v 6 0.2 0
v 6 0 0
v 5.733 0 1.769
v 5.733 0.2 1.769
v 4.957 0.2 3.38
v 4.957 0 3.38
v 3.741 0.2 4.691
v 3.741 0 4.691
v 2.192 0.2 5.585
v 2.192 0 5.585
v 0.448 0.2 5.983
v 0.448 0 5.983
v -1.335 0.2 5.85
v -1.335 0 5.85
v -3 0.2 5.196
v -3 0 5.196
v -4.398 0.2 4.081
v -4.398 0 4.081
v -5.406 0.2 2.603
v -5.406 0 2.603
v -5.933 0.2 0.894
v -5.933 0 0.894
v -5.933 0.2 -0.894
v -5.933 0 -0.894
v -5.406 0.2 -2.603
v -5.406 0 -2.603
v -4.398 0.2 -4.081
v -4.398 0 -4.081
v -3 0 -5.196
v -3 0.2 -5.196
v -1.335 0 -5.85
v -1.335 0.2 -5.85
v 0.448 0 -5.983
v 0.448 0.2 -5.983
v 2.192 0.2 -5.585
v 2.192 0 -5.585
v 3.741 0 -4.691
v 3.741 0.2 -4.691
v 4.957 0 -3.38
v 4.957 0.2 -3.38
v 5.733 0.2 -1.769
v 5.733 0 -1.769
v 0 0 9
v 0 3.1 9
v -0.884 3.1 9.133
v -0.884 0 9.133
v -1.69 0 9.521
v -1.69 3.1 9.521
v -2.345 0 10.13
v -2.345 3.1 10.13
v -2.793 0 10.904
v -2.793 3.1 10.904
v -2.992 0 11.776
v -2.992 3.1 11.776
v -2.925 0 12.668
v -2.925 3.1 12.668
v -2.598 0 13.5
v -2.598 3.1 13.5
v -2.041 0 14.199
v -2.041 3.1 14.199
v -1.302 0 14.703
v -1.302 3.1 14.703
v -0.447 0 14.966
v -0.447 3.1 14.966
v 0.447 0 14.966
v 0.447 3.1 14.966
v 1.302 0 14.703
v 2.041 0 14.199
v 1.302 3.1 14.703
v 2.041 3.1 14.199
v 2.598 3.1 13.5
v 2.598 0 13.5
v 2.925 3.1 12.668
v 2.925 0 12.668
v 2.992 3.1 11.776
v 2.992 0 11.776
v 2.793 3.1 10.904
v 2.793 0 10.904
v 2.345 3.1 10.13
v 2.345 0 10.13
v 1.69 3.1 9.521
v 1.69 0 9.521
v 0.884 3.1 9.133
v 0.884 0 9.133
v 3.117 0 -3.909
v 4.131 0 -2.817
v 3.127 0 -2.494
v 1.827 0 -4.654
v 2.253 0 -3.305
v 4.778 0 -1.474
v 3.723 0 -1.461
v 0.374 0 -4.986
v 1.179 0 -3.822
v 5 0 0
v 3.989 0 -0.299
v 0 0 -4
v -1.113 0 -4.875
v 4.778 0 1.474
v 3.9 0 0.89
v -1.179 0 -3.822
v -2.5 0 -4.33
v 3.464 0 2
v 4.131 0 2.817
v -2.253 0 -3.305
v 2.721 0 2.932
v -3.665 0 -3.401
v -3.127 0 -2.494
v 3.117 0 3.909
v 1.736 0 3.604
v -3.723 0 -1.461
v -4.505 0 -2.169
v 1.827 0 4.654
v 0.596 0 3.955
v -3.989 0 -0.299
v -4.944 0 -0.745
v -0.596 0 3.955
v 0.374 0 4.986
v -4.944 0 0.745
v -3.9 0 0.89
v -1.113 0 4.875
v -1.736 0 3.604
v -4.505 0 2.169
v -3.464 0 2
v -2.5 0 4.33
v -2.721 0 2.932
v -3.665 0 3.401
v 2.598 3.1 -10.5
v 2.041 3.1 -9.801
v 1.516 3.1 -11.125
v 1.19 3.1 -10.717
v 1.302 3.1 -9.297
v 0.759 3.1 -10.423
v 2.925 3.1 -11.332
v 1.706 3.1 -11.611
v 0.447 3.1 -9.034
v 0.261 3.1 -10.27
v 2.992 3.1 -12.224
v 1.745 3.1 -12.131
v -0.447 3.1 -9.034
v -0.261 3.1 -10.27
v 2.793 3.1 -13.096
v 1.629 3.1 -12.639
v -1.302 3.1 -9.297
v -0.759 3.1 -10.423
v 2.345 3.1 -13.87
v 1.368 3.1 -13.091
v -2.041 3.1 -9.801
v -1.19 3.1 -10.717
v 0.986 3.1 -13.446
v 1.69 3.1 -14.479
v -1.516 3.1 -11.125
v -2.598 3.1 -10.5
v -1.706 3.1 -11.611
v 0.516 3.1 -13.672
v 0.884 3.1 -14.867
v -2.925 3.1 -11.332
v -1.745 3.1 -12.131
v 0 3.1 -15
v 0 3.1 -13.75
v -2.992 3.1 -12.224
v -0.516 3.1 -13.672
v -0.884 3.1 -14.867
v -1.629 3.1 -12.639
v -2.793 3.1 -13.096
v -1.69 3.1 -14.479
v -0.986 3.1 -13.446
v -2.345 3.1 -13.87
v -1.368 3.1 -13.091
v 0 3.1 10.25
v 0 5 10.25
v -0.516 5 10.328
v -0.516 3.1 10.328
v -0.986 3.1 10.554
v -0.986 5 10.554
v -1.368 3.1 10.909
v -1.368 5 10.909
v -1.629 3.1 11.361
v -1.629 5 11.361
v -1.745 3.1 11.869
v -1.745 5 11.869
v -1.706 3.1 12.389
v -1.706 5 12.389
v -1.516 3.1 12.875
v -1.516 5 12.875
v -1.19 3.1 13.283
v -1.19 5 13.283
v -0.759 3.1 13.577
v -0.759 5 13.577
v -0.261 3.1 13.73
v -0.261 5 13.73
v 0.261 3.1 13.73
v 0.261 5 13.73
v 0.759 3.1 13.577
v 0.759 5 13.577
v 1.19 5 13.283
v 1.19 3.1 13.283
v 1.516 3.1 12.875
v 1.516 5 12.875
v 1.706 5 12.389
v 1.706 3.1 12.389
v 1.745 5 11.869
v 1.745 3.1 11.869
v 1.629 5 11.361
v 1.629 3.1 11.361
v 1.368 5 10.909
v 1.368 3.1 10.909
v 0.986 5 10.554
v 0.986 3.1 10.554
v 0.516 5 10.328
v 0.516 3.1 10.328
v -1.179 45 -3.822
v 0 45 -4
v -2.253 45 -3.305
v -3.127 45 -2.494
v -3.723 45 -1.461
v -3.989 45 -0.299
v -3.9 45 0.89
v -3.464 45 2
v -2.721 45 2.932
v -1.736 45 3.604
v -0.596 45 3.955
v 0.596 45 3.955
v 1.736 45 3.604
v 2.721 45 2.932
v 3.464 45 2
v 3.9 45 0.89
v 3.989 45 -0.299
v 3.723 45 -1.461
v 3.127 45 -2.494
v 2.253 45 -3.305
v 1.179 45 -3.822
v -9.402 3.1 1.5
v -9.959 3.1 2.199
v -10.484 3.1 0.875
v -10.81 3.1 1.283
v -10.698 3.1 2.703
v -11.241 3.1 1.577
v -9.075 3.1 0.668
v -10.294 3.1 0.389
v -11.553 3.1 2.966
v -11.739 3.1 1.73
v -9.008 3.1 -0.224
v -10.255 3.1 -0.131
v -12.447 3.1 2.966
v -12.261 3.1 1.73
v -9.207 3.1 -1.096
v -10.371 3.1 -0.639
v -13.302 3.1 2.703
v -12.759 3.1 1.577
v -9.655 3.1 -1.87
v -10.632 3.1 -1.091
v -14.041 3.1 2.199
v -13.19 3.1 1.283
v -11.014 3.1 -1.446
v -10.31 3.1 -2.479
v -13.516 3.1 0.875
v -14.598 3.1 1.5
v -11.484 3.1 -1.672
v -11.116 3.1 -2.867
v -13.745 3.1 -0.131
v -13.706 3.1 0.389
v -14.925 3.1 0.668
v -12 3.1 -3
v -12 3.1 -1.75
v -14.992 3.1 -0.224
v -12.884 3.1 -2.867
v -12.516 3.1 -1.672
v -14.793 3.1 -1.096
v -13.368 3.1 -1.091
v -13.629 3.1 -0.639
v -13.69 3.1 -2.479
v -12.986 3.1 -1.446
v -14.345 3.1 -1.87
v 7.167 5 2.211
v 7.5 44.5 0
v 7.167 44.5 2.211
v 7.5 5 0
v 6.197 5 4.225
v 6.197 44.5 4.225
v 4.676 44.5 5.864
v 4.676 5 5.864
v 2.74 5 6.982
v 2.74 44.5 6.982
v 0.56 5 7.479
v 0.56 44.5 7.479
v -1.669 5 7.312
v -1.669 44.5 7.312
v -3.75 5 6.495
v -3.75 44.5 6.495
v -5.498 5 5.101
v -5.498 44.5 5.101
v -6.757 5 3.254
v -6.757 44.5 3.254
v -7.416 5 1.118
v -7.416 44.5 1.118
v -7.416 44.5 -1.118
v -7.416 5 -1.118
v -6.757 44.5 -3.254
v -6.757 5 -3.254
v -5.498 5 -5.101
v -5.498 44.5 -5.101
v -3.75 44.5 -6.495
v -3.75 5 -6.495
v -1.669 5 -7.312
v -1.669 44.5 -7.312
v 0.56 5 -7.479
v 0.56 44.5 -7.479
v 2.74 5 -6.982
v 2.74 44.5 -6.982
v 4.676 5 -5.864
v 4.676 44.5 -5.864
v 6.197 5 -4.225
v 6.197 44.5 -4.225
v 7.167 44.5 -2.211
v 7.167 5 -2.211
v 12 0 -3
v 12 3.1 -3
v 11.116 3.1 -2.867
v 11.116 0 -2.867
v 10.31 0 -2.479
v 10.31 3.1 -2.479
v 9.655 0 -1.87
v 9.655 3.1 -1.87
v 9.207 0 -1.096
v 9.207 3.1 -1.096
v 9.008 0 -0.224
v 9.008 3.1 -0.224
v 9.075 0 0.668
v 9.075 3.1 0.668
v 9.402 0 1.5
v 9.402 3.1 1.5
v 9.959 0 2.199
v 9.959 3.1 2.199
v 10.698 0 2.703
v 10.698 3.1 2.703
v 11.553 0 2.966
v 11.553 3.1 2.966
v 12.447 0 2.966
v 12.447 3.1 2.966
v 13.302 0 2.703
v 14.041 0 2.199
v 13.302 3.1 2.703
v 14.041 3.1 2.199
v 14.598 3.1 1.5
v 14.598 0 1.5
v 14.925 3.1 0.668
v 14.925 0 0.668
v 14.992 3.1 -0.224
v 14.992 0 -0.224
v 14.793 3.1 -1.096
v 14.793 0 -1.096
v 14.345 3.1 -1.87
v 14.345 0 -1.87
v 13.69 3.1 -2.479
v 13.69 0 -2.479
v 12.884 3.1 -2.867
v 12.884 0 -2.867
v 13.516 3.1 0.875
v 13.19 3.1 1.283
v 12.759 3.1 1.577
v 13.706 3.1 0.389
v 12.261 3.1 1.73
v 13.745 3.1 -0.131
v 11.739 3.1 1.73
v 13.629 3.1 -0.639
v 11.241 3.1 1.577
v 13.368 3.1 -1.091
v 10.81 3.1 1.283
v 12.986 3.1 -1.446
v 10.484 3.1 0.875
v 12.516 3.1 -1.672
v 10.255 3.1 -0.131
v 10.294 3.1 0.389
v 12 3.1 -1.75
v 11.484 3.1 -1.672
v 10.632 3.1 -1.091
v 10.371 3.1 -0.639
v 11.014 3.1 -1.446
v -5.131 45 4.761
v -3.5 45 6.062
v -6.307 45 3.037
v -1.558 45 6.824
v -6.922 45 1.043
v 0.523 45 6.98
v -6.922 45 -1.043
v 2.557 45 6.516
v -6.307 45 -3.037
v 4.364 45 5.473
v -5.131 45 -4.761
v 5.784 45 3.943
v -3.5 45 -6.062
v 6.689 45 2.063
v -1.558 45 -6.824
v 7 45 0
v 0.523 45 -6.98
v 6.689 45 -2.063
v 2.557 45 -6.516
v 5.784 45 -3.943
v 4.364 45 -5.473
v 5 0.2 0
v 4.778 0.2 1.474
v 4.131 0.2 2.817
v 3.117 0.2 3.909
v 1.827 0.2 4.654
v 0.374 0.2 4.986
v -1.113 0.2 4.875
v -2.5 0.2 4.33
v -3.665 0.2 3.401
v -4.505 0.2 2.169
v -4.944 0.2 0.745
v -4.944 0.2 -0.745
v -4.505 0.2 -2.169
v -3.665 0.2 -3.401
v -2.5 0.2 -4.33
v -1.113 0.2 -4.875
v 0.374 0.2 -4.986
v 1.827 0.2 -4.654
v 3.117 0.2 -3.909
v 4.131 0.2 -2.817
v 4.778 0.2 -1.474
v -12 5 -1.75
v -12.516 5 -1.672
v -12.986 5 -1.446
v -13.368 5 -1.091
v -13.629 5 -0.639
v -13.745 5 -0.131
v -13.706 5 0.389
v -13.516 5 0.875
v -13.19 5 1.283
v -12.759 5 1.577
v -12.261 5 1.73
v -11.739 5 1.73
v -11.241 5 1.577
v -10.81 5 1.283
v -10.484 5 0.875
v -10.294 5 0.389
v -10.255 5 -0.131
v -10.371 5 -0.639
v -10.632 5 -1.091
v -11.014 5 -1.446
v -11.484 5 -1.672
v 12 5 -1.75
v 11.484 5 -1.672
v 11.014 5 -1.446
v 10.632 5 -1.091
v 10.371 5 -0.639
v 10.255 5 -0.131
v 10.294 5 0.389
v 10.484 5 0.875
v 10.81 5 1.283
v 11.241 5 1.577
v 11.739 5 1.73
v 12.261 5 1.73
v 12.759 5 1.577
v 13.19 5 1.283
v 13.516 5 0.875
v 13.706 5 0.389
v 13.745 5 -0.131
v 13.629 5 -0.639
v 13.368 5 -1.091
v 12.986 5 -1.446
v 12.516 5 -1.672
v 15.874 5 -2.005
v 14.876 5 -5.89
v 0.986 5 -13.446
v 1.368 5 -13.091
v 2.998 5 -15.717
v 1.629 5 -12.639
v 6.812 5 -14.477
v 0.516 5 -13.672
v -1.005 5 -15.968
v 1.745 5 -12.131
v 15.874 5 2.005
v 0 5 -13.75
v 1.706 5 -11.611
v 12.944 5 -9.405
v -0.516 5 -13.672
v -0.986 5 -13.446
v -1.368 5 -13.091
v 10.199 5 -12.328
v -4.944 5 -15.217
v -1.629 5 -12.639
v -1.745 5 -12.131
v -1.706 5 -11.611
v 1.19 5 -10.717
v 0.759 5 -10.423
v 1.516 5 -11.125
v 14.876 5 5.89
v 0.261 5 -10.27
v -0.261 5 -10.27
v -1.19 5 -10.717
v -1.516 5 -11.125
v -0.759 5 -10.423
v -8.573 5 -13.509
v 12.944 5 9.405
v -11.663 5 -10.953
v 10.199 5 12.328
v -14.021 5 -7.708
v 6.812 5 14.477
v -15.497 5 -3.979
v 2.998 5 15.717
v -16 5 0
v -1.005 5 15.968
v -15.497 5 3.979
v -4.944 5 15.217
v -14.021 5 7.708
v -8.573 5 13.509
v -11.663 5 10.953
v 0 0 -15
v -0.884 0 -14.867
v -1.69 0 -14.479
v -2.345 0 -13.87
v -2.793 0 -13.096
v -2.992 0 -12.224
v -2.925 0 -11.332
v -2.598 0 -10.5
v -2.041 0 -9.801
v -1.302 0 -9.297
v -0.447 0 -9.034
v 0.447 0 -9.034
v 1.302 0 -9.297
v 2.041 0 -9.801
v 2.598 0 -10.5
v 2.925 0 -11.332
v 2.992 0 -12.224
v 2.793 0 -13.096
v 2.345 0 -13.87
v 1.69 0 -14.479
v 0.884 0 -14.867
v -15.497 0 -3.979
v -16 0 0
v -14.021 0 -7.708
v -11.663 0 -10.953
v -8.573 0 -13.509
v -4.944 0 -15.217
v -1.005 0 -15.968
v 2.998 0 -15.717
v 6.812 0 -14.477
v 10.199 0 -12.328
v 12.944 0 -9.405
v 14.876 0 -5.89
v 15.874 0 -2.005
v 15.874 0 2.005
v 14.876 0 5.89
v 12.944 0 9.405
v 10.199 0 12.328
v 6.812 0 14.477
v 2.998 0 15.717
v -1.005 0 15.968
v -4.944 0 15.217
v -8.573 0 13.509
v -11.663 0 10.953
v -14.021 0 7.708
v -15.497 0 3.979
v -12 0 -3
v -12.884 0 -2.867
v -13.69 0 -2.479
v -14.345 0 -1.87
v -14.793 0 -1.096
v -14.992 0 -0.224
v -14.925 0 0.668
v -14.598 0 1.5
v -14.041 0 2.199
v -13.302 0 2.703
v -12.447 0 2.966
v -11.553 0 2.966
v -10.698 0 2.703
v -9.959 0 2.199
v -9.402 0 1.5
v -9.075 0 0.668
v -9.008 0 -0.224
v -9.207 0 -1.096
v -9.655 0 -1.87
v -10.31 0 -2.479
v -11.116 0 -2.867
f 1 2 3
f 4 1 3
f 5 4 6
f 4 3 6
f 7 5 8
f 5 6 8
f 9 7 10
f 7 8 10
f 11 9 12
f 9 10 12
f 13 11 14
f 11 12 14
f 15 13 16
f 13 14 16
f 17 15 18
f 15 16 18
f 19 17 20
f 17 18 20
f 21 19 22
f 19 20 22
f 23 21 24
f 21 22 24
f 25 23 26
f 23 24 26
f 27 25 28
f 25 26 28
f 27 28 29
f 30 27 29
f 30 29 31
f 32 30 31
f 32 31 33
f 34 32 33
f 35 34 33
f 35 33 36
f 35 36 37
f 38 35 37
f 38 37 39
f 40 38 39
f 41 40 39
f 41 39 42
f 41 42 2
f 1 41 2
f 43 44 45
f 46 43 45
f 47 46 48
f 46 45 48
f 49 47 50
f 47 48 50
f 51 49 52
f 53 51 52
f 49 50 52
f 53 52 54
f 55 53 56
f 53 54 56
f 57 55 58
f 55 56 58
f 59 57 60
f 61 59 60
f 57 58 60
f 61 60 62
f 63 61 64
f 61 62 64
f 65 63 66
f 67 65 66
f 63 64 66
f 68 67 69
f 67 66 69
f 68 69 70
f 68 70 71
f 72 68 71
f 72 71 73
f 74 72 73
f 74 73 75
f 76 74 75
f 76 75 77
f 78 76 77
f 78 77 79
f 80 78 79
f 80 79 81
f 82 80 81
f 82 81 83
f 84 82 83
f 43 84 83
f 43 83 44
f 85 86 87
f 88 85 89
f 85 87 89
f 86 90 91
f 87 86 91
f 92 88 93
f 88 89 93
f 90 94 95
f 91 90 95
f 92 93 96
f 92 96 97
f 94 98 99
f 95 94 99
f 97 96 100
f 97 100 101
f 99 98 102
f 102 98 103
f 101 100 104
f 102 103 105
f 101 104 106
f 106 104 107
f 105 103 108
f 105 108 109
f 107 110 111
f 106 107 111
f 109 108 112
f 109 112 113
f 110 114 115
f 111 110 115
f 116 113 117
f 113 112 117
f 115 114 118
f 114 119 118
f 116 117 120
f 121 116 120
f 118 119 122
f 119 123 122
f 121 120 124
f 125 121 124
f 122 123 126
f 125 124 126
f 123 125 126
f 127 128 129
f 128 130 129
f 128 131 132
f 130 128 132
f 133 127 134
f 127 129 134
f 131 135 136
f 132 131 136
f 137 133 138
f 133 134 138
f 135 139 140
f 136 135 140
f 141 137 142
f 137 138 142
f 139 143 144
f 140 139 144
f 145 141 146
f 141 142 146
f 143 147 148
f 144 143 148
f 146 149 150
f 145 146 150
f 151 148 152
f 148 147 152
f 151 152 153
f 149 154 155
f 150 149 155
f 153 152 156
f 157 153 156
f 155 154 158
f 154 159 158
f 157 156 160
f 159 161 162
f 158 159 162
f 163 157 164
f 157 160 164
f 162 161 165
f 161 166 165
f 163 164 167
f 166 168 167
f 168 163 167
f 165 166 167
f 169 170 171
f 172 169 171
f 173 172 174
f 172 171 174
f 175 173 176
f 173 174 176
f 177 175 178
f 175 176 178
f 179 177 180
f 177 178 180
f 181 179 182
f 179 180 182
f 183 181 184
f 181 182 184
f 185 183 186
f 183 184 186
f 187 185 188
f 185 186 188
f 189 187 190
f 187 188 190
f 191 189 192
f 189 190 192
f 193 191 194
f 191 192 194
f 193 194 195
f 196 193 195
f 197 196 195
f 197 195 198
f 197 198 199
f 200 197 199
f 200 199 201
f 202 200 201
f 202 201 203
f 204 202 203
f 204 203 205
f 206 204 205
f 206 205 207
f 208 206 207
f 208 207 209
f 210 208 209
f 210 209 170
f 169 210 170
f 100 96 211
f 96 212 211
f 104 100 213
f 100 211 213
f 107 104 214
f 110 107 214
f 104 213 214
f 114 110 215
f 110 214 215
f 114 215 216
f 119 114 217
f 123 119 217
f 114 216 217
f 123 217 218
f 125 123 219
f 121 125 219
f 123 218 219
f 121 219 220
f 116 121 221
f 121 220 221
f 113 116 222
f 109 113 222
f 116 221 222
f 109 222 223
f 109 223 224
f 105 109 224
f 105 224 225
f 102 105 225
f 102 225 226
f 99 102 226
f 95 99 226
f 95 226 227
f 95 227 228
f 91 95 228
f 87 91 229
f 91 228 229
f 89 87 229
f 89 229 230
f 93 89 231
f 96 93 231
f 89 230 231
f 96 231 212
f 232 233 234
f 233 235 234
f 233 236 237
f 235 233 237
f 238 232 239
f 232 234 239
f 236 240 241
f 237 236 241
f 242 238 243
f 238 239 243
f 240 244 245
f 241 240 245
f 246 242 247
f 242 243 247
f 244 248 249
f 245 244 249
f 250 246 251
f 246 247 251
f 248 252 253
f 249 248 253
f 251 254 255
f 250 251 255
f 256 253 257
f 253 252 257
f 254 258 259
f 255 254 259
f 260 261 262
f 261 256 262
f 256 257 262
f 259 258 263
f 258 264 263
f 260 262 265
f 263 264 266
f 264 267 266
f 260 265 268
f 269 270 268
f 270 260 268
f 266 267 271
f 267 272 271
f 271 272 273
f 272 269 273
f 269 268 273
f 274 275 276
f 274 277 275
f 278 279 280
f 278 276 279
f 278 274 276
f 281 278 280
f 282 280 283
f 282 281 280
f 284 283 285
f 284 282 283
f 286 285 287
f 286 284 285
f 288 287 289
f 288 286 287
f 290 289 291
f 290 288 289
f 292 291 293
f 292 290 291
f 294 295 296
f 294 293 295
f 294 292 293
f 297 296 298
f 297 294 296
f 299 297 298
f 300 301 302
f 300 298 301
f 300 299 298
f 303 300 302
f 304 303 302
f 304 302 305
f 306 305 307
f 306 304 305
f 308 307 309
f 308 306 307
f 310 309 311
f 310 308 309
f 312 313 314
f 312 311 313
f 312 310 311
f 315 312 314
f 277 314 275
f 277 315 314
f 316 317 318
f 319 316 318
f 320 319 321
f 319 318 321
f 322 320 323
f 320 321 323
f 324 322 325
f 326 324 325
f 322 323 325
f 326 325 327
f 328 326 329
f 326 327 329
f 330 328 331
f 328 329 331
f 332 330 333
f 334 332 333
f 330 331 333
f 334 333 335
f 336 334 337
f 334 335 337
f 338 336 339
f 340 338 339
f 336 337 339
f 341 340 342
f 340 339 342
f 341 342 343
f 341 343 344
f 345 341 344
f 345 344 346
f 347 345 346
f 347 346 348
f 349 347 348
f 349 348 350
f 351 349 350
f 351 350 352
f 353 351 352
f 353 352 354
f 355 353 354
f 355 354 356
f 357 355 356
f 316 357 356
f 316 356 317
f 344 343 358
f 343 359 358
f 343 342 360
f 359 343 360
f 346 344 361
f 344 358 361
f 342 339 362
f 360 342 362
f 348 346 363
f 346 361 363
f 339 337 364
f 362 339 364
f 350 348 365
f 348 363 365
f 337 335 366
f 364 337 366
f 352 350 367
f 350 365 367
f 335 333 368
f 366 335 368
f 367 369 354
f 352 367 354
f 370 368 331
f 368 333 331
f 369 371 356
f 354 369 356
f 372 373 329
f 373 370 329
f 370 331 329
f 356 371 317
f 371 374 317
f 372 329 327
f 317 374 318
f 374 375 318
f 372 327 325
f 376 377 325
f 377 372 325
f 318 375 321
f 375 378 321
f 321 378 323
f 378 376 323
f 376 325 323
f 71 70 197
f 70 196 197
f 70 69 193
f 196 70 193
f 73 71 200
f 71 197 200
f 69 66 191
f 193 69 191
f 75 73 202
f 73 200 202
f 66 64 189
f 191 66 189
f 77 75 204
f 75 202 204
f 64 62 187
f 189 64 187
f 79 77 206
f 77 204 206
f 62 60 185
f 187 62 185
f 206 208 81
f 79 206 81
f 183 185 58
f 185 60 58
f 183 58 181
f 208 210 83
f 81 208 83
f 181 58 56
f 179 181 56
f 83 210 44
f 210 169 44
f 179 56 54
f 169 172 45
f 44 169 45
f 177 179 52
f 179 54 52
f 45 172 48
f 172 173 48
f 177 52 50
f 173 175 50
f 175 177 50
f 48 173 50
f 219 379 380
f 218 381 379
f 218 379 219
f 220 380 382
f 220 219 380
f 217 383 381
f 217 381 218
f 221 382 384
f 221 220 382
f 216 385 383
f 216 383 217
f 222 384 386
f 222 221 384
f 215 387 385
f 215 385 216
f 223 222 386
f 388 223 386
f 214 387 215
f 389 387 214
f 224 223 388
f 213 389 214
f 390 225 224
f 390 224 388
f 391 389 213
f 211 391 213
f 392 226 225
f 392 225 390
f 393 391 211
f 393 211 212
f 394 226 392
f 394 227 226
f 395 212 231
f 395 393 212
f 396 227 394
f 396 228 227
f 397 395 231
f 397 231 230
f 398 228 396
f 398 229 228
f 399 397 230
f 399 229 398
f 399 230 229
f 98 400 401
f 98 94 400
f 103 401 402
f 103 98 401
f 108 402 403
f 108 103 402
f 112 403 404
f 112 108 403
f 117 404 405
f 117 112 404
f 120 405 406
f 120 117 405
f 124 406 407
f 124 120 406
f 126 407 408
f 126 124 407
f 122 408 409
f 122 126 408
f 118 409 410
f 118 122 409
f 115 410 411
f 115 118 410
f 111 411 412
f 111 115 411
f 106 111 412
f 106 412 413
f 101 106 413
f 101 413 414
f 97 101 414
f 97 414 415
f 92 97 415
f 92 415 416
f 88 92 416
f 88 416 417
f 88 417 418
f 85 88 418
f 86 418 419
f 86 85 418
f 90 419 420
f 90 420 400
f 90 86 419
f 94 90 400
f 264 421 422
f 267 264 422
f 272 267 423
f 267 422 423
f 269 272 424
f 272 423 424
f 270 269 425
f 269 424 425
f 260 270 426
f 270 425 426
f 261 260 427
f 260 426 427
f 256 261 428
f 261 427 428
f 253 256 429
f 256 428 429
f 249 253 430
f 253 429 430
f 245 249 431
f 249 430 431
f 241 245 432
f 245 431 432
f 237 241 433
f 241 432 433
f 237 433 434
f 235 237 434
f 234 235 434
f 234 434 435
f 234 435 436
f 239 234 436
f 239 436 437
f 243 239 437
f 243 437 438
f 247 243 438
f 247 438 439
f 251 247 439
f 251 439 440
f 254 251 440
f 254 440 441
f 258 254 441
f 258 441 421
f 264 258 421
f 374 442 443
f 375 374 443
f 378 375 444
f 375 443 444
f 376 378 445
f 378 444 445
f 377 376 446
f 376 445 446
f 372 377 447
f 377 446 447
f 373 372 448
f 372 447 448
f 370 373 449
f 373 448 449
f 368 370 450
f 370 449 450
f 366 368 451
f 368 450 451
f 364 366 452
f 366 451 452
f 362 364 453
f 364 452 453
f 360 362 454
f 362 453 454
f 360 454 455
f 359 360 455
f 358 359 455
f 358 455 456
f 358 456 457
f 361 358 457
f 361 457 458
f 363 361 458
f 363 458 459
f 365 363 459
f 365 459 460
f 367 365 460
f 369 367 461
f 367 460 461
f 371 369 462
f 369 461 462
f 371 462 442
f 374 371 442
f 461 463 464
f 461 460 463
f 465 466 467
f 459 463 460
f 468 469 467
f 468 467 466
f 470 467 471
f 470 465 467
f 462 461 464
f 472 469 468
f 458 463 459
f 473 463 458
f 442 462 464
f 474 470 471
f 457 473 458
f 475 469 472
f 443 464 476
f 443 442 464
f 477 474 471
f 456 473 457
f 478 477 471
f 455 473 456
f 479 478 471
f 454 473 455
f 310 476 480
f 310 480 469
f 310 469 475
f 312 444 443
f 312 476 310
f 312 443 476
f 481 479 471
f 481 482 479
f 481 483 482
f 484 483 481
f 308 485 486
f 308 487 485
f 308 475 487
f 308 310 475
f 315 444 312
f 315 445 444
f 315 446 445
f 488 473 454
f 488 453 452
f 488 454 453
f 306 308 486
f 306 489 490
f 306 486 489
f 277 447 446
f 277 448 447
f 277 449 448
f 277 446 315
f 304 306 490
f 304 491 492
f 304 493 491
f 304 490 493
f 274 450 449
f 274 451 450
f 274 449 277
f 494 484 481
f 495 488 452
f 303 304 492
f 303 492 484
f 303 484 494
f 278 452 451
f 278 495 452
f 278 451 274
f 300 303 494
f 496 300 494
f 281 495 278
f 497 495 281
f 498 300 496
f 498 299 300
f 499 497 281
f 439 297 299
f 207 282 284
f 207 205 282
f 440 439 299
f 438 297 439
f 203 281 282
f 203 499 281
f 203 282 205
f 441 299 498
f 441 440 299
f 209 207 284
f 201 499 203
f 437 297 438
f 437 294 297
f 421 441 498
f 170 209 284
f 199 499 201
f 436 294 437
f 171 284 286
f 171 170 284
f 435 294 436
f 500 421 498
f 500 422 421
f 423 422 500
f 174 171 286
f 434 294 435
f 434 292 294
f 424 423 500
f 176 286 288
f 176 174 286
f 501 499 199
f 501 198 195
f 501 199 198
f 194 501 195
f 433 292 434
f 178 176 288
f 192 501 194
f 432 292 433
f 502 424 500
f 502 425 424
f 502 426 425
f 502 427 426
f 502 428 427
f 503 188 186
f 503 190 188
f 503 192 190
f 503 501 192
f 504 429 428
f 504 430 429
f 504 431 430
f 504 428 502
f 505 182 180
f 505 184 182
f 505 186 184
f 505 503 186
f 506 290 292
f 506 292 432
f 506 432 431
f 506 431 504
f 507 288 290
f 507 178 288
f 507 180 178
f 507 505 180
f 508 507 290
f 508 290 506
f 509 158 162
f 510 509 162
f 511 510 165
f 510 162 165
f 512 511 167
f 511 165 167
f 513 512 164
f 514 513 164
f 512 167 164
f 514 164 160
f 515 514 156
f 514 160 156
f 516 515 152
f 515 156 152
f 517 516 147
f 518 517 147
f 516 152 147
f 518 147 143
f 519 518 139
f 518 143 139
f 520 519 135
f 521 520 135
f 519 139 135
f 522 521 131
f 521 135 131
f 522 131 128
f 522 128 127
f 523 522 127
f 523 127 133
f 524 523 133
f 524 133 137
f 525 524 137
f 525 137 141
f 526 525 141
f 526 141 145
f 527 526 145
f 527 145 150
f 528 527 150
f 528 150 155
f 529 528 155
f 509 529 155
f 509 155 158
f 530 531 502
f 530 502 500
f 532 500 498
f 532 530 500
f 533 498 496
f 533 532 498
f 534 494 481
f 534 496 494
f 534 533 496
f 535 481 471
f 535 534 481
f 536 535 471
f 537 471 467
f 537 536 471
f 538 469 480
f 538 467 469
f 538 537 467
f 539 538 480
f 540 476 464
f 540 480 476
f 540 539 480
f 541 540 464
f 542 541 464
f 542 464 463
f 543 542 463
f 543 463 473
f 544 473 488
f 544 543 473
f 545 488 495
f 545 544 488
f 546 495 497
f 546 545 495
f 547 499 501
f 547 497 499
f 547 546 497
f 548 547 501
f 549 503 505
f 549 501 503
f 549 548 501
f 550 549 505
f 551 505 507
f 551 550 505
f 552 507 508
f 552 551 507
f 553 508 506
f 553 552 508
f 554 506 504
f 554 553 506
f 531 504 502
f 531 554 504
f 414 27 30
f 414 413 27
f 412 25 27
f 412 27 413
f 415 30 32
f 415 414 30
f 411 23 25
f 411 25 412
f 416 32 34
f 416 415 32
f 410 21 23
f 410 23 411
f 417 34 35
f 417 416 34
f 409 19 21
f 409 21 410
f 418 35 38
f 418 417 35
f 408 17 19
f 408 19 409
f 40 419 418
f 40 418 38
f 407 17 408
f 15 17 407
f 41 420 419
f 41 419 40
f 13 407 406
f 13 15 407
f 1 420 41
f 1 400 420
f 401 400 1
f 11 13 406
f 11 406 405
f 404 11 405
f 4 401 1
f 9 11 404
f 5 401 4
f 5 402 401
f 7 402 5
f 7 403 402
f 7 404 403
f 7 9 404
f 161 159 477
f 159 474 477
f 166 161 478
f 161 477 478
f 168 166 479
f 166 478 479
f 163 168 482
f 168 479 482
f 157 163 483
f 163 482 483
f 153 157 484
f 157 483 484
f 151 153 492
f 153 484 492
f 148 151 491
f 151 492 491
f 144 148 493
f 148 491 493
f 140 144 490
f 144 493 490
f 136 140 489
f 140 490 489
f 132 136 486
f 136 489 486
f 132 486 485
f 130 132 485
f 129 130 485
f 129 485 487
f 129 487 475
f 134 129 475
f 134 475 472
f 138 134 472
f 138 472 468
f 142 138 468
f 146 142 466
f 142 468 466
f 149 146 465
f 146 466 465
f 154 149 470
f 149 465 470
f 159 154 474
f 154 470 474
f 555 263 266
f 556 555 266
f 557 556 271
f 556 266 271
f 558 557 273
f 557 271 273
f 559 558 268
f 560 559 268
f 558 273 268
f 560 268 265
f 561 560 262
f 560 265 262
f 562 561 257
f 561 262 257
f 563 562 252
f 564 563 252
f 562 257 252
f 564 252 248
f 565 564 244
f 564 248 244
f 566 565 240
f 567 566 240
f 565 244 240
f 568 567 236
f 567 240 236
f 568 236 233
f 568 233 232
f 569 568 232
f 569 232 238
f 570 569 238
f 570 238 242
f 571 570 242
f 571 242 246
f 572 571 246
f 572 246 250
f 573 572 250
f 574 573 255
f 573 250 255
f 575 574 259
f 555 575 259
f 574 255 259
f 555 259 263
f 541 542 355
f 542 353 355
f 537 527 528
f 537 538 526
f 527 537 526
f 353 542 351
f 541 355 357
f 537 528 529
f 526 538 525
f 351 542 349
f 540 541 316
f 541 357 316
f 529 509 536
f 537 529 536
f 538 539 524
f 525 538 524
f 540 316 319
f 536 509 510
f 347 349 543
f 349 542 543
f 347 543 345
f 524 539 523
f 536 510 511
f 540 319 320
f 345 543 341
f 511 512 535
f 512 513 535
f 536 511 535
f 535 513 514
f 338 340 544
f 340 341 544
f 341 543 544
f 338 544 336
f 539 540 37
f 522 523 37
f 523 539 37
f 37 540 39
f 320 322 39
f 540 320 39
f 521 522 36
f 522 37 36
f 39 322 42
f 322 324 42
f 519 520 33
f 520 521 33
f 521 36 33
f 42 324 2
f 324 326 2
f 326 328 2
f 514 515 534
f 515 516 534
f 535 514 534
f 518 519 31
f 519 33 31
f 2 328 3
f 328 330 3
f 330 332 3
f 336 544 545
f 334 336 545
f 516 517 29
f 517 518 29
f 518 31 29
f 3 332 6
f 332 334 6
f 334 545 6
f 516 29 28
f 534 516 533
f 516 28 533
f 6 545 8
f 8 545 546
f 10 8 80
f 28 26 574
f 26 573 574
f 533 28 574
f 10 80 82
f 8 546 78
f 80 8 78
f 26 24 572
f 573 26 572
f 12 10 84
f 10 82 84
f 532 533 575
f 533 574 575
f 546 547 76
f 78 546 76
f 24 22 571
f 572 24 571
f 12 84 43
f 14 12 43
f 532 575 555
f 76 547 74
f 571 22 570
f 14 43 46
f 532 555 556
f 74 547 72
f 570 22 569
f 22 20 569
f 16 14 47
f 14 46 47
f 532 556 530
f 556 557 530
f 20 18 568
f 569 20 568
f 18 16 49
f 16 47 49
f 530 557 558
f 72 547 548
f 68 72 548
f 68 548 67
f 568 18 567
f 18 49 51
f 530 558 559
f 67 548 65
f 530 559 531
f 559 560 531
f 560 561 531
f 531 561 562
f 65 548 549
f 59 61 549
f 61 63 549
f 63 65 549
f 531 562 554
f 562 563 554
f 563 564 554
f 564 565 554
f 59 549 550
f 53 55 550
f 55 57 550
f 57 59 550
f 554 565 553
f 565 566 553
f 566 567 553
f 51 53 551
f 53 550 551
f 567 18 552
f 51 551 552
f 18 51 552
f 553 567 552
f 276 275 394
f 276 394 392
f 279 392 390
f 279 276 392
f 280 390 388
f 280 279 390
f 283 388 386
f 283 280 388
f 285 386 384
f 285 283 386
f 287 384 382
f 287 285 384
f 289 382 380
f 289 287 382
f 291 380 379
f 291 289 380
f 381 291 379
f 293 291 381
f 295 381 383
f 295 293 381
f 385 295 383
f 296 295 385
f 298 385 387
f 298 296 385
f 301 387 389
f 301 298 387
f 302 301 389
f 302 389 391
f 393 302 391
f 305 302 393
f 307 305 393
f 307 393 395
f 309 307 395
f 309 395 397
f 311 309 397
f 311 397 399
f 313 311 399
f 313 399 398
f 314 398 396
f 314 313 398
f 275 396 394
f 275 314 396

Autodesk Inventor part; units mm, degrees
ref_plane "YZ Plane" through (0, 0, 0) normal (1, 0, 0) x (0, 1, 0)
ref_plane "XZ Plane" through (0, 0, 0) normal (0, 1, 0) x (-1, 0, 0)
ref_plane "XY Plane" through (0, 0, 0) normal (0, 0, 1) x (1, 0, 0)
sketch "Sketch1" plane through (0, 0, 0) normal (0, 1, 0) x (-1, 0, 0)
  circle A0 centre (0, 0) radius 16
  dimension "d0" = 32
extrude "Extrusion1" add sketch "Sketch1" along normal blind 5
sketch "Sketch2" plane through (0, 5, 0) normal (0, 1, 0) x (1, 0, 0)
  circle A0 centre (0, 0) radius 7.5
  dimension "d3" = 15
extrude "Extrusion2" add sketch "Sketch2" along normal blind 40
sketch "Sketch3" plane through (0, 0, 0) normal (0, -1, 0) x (1, 0, 0)
  circle A0 centre (0, 0) radius 12 construction
  point P0 (0, 12)
  point P1 (12, 0)
  point P2 (0, -12)
  point P3 (-12, 0)
  dimension "d6" = 24
hole "Hole1" at (0, 0, 12) at (12, 0, 0) at (0, 0, -12) at (-12, 0, 0) direction (0, 1, 0) diameter 3.5 end through all counterbore diameter 6 counterbore depth 3.1 clearance for "Hex Head Cap Screw ISO 24017" size "M3" standard "ISO"
sketch "Sketch4" plane through (0, 0, 0) normal (0, -1, 0) x (1, 0, 0)
  point P0 (0, 0)
  point P1 (0, 0)
hole "Hole2" at (0, 0, 0) direction (0, 1, 0) diameter 8 end through all
sketch "Sketch5" plane through (0, 0, 0) normal (0, -1, 0) x (1, 0, 0)
  circle A0 centre (0, 0) radius 5
  circle A1 centre (0, 0) radius 6
  dimension "d21" = 10
  dimension "d22" = 12
extrude "Extrusion3" cut sketch "Sketch5" against normal blind 0.2
chamfer "Chamfer1" distance 0.5 angle 45 1 edges at (-7.5, 45, 0)
properties part number "Łożysko liniowe z kołnierzem okrągłym LMF08UU-L" material "Stainless Steel"
